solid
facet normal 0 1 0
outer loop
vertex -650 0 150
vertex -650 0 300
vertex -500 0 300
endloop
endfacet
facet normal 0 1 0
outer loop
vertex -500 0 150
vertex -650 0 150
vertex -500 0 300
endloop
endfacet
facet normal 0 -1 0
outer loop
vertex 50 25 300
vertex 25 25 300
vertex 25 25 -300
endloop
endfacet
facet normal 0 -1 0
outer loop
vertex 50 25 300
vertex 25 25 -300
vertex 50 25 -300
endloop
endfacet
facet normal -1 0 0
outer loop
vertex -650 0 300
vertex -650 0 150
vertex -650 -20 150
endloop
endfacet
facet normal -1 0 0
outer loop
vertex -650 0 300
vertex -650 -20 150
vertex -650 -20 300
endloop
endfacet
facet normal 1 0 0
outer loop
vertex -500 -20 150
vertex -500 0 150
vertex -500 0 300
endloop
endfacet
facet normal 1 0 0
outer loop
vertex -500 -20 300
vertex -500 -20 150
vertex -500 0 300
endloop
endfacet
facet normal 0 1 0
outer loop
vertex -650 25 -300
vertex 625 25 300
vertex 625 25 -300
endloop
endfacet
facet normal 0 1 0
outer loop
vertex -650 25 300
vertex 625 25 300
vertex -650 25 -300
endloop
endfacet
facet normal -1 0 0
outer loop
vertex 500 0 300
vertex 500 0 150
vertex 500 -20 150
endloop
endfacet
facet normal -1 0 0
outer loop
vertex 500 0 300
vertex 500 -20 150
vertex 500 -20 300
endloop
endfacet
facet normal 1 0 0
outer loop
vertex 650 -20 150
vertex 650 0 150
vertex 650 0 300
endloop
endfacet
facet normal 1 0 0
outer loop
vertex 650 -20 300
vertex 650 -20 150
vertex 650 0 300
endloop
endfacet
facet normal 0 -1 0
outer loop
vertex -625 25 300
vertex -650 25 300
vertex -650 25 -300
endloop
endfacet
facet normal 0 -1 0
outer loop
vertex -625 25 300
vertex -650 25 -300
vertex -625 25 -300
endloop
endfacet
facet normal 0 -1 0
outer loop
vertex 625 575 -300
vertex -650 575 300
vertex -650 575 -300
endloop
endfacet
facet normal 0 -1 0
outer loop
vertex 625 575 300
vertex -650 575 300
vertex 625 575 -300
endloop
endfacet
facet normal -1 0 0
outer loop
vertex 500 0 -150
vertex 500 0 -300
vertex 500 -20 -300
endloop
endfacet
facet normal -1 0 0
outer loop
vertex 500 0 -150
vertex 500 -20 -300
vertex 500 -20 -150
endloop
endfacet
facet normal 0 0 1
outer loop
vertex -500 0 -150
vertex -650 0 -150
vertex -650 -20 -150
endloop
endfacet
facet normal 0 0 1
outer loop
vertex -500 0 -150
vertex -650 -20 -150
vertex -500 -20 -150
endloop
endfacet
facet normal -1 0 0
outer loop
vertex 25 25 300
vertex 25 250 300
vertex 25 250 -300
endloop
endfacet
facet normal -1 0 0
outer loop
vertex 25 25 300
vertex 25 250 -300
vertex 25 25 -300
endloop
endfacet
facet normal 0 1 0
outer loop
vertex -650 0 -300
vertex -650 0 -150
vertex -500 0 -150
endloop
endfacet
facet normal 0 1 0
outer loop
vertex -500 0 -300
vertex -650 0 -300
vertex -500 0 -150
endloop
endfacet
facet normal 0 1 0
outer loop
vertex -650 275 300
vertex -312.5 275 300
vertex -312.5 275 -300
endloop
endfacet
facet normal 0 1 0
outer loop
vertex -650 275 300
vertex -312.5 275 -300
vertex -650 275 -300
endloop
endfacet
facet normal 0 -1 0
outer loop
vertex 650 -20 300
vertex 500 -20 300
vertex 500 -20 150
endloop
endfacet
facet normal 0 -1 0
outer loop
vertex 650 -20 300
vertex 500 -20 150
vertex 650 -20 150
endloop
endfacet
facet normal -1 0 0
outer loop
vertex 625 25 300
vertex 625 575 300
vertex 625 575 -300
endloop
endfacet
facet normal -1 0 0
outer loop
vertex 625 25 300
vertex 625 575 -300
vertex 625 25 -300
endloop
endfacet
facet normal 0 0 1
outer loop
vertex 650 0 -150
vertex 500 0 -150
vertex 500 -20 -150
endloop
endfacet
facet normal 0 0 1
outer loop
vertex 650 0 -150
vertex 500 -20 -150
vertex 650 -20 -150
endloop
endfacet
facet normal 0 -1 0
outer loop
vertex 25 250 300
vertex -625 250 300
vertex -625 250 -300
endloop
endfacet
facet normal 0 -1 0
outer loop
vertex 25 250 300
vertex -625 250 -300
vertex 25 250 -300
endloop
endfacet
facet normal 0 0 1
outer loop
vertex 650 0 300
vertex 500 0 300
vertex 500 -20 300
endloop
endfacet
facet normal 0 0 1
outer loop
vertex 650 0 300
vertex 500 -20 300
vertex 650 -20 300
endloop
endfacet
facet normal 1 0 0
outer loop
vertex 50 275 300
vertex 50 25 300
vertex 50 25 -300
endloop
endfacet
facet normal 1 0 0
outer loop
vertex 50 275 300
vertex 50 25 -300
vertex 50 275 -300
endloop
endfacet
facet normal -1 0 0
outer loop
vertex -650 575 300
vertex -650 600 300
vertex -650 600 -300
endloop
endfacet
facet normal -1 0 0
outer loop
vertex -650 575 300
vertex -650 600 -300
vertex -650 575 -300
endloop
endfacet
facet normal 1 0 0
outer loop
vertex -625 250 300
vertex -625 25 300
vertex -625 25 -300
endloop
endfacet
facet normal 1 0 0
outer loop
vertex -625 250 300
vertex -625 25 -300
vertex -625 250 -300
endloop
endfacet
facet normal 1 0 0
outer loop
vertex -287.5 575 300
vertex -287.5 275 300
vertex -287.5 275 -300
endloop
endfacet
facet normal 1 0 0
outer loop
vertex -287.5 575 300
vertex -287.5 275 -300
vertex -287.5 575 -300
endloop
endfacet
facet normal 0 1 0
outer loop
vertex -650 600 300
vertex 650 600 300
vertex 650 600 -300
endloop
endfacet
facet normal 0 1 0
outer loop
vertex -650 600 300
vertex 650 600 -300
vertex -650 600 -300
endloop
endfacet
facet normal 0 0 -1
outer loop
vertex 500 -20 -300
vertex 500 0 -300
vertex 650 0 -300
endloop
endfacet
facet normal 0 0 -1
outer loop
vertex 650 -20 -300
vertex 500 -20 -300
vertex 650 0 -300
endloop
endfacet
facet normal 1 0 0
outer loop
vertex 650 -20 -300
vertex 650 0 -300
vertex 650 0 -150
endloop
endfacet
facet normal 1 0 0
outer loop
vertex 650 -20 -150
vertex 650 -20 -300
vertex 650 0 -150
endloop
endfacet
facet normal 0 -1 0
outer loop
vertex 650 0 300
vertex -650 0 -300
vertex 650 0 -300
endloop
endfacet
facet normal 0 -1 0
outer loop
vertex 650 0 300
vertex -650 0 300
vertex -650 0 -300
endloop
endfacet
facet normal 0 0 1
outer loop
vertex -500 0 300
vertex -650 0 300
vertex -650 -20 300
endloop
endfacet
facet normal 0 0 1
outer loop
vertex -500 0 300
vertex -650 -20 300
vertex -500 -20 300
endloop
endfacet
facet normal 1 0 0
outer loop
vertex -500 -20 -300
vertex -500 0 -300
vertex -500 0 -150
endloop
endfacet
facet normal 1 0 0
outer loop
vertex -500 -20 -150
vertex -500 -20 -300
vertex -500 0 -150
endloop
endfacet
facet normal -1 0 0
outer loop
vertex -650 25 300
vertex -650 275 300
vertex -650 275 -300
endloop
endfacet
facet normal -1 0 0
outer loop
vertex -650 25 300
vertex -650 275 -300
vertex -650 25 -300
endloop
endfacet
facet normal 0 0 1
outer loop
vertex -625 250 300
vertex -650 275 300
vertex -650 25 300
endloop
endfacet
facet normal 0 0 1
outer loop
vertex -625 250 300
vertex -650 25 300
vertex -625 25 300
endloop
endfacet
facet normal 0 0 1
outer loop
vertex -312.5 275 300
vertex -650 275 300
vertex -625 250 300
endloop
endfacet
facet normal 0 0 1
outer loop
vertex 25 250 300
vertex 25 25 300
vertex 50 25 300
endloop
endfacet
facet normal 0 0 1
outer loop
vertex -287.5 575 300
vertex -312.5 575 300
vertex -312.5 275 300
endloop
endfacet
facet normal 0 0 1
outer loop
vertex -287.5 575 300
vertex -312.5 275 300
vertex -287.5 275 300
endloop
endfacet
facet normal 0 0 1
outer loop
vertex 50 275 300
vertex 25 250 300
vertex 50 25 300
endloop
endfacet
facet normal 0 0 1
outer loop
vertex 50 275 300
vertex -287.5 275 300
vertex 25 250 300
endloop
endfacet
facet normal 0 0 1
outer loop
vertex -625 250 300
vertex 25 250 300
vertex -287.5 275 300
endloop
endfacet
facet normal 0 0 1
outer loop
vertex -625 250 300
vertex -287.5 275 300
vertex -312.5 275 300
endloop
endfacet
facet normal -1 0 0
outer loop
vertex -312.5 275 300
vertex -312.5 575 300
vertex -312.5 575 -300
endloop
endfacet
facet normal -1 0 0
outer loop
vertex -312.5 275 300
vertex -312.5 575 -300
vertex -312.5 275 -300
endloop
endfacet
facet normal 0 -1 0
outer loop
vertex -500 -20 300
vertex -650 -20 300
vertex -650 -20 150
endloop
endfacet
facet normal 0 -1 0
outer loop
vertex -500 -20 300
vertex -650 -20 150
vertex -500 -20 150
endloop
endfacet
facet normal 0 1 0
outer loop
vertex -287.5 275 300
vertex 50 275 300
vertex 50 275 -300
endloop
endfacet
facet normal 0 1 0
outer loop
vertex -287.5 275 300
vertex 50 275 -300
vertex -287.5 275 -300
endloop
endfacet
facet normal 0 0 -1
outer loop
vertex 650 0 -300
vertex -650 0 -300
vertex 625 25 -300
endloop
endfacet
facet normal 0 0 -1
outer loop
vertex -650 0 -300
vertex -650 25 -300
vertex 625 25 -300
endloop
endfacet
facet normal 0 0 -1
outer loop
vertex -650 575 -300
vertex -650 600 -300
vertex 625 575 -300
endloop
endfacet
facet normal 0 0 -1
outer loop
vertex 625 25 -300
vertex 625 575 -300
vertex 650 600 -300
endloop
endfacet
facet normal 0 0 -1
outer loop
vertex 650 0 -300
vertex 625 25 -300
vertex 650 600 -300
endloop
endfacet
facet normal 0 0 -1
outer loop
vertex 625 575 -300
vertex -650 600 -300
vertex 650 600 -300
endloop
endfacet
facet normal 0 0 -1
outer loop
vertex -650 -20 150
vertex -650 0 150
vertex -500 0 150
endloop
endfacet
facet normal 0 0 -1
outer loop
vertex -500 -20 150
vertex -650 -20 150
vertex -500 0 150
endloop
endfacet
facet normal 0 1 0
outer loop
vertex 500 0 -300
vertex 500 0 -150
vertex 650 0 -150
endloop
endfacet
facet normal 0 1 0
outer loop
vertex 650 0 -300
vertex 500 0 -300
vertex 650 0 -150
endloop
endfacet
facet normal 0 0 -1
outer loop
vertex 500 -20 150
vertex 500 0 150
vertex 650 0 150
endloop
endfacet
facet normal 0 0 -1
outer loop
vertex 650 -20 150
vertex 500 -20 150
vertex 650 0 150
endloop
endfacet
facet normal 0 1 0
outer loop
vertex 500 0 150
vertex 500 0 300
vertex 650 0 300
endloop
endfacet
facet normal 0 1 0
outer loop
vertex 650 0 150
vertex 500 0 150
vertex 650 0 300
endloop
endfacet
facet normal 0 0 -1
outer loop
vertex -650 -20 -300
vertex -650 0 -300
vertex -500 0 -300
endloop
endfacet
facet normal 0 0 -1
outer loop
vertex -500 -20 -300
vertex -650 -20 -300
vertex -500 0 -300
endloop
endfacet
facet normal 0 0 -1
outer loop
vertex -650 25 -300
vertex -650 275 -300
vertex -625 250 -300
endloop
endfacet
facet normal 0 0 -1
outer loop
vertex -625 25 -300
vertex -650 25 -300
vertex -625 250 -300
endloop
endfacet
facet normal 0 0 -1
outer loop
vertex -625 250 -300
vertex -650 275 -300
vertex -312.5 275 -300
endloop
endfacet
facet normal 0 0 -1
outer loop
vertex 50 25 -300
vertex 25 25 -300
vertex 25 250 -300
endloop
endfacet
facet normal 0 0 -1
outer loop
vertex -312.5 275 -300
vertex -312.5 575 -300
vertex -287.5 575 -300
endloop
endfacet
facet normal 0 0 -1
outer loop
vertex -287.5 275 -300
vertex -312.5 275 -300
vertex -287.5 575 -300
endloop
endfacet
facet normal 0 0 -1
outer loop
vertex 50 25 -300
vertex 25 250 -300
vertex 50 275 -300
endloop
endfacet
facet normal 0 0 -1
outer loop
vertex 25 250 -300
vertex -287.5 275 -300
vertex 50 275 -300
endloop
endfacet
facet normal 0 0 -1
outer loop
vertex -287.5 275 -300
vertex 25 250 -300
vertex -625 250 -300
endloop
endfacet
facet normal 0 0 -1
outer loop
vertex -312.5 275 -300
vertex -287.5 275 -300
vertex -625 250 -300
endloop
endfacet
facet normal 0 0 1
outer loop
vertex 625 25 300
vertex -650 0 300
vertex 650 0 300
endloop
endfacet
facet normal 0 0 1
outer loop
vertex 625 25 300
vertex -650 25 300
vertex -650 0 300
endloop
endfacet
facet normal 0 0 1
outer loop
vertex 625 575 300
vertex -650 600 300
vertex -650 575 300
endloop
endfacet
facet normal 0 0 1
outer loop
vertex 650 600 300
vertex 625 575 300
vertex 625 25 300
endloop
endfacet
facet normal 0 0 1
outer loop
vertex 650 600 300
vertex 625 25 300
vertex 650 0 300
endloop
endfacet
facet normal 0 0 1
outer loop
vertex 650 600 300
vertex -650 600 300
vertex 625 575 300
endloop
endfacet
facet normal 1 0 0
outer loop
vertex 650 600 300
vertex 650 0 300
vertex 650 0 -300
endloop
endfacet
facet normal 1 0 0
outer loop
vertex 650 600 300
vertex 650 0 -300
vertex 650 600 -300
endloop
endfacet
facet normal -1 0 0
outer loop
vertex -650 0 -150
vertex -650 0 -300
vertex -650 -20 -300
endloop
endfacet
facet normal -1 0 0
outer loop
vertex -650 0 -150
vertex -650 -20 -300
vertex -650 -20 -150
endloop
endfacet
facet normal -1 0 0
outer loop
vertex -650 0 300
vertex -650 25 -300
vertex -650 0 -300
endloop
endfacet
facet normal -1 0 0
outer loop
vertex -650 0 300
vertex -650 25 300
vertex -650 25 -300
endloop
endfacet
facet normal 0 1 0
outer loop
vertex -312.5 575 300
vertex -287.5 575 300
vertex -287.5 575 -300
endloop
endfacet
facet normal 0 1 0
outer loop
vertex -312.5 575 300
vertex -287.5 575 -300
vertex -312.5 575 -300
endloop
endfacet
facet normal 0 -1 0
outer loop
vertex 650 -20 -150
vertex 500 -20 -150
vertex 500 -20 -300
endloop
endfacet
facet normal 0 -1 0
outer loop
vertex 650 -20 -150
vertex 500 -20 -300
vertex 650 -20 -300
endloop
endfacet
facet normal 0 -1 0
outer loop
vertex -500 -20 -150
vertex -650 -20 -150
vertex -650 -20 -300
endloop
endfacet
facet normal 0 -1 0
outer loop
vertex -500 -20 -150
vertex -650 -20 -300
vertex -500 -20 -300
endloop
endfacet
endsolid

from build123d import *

# Parameters (mm, degrees)
BOSS_EXTRUDE1_DEPTH   = 300
BOSS_EXTRUDE2_DEPTH   = 600
SKETCH3_W             = 150
SKETCH3_H             = 150
BOSS_EXTRUDE3_DEPTH   = 20
BOSS_EXTRUDE3_2_DEPTH = 20
BOSS_EXTRUDE3_3_DEPTH = 20
BOSS_EXTRUDE3_4_DEPTH = 20


with BuildPart() as part:
    # Sketch1 → Boss-Extrude1 (new body, symmetric)
    with BuildSketch(Plane.XY):
        Polygon((-650, 0), (650, 0), (650, 600), (-650, 600), (-650, 575), (625, 575), (625, 25), (-650, 25), align=None)
    extrude(amount=BOSS_EXTRUDE1_DEPTH, both=True)


with BuildPart() as body_2:
    # Sketch2 → Boss-Extrude2 (new body)
    with BuildSketch(Plane.XY.offset(300)):
        Polygon((-312.5, 575), (-312.5, 275), (-650, 275), (-650, 25), (-625, 25), (-625, 250), (25, 250), (25, 25), (50, 25), (50, 275), (-287.5, 275), (-287.5, 575), align=None)
    extrude(amount=-BOSS_EXTRUDE2_DEPTH)


with BuildPart() as body_3:
    # Sketch3 → Boss-Extrude3 (new body)
    with BuildSketch(Plane.XZ):
        with Locations((-575, 225)):
            Rectangle(SKETCH3_W, SKETCH3_H)
    extrude(amount=BOSS_EXTRUDE3_DEPTH)


with BuildPart() as body_4:
    # Sketch3 → Boss-Extrude3 2 (new body)
    with BuildSketch(Plane.XZ):
        with Locations((-575, -225)):
            Rectangle(SKETCH3_W, SKETCH3_H)
    extrude(amount=BOSS_EXTRUDE3_2_DEPTH)


with BuildPart() as body_5:
    # Sketch3 → Boss-Extrude3 3 (new body)
    with BuildSketch(Plane.XZ):
        with Locations((575, 225)):
            Rectangle(SKETCH3_W, SKETCH3_H)
    extrude(amount=BOSS_EXTRUDE3_3_DEPTH)


with BuildPart() as body_6:
    # Sketch3 → Boss-Extrude3 4 (new body)
    with BuildSketch(Plane.XZ):
        with Locations((575, -225)):
            Rectangle(SKETCH3_W, SKETCH3_H)
    extrude(amount=BOSS_EXTRUDE3_4_DEPTH)


solid = Compound([part.part, body_2.part, body_3.part, body_4.part, body_5.part, body_6.part])
